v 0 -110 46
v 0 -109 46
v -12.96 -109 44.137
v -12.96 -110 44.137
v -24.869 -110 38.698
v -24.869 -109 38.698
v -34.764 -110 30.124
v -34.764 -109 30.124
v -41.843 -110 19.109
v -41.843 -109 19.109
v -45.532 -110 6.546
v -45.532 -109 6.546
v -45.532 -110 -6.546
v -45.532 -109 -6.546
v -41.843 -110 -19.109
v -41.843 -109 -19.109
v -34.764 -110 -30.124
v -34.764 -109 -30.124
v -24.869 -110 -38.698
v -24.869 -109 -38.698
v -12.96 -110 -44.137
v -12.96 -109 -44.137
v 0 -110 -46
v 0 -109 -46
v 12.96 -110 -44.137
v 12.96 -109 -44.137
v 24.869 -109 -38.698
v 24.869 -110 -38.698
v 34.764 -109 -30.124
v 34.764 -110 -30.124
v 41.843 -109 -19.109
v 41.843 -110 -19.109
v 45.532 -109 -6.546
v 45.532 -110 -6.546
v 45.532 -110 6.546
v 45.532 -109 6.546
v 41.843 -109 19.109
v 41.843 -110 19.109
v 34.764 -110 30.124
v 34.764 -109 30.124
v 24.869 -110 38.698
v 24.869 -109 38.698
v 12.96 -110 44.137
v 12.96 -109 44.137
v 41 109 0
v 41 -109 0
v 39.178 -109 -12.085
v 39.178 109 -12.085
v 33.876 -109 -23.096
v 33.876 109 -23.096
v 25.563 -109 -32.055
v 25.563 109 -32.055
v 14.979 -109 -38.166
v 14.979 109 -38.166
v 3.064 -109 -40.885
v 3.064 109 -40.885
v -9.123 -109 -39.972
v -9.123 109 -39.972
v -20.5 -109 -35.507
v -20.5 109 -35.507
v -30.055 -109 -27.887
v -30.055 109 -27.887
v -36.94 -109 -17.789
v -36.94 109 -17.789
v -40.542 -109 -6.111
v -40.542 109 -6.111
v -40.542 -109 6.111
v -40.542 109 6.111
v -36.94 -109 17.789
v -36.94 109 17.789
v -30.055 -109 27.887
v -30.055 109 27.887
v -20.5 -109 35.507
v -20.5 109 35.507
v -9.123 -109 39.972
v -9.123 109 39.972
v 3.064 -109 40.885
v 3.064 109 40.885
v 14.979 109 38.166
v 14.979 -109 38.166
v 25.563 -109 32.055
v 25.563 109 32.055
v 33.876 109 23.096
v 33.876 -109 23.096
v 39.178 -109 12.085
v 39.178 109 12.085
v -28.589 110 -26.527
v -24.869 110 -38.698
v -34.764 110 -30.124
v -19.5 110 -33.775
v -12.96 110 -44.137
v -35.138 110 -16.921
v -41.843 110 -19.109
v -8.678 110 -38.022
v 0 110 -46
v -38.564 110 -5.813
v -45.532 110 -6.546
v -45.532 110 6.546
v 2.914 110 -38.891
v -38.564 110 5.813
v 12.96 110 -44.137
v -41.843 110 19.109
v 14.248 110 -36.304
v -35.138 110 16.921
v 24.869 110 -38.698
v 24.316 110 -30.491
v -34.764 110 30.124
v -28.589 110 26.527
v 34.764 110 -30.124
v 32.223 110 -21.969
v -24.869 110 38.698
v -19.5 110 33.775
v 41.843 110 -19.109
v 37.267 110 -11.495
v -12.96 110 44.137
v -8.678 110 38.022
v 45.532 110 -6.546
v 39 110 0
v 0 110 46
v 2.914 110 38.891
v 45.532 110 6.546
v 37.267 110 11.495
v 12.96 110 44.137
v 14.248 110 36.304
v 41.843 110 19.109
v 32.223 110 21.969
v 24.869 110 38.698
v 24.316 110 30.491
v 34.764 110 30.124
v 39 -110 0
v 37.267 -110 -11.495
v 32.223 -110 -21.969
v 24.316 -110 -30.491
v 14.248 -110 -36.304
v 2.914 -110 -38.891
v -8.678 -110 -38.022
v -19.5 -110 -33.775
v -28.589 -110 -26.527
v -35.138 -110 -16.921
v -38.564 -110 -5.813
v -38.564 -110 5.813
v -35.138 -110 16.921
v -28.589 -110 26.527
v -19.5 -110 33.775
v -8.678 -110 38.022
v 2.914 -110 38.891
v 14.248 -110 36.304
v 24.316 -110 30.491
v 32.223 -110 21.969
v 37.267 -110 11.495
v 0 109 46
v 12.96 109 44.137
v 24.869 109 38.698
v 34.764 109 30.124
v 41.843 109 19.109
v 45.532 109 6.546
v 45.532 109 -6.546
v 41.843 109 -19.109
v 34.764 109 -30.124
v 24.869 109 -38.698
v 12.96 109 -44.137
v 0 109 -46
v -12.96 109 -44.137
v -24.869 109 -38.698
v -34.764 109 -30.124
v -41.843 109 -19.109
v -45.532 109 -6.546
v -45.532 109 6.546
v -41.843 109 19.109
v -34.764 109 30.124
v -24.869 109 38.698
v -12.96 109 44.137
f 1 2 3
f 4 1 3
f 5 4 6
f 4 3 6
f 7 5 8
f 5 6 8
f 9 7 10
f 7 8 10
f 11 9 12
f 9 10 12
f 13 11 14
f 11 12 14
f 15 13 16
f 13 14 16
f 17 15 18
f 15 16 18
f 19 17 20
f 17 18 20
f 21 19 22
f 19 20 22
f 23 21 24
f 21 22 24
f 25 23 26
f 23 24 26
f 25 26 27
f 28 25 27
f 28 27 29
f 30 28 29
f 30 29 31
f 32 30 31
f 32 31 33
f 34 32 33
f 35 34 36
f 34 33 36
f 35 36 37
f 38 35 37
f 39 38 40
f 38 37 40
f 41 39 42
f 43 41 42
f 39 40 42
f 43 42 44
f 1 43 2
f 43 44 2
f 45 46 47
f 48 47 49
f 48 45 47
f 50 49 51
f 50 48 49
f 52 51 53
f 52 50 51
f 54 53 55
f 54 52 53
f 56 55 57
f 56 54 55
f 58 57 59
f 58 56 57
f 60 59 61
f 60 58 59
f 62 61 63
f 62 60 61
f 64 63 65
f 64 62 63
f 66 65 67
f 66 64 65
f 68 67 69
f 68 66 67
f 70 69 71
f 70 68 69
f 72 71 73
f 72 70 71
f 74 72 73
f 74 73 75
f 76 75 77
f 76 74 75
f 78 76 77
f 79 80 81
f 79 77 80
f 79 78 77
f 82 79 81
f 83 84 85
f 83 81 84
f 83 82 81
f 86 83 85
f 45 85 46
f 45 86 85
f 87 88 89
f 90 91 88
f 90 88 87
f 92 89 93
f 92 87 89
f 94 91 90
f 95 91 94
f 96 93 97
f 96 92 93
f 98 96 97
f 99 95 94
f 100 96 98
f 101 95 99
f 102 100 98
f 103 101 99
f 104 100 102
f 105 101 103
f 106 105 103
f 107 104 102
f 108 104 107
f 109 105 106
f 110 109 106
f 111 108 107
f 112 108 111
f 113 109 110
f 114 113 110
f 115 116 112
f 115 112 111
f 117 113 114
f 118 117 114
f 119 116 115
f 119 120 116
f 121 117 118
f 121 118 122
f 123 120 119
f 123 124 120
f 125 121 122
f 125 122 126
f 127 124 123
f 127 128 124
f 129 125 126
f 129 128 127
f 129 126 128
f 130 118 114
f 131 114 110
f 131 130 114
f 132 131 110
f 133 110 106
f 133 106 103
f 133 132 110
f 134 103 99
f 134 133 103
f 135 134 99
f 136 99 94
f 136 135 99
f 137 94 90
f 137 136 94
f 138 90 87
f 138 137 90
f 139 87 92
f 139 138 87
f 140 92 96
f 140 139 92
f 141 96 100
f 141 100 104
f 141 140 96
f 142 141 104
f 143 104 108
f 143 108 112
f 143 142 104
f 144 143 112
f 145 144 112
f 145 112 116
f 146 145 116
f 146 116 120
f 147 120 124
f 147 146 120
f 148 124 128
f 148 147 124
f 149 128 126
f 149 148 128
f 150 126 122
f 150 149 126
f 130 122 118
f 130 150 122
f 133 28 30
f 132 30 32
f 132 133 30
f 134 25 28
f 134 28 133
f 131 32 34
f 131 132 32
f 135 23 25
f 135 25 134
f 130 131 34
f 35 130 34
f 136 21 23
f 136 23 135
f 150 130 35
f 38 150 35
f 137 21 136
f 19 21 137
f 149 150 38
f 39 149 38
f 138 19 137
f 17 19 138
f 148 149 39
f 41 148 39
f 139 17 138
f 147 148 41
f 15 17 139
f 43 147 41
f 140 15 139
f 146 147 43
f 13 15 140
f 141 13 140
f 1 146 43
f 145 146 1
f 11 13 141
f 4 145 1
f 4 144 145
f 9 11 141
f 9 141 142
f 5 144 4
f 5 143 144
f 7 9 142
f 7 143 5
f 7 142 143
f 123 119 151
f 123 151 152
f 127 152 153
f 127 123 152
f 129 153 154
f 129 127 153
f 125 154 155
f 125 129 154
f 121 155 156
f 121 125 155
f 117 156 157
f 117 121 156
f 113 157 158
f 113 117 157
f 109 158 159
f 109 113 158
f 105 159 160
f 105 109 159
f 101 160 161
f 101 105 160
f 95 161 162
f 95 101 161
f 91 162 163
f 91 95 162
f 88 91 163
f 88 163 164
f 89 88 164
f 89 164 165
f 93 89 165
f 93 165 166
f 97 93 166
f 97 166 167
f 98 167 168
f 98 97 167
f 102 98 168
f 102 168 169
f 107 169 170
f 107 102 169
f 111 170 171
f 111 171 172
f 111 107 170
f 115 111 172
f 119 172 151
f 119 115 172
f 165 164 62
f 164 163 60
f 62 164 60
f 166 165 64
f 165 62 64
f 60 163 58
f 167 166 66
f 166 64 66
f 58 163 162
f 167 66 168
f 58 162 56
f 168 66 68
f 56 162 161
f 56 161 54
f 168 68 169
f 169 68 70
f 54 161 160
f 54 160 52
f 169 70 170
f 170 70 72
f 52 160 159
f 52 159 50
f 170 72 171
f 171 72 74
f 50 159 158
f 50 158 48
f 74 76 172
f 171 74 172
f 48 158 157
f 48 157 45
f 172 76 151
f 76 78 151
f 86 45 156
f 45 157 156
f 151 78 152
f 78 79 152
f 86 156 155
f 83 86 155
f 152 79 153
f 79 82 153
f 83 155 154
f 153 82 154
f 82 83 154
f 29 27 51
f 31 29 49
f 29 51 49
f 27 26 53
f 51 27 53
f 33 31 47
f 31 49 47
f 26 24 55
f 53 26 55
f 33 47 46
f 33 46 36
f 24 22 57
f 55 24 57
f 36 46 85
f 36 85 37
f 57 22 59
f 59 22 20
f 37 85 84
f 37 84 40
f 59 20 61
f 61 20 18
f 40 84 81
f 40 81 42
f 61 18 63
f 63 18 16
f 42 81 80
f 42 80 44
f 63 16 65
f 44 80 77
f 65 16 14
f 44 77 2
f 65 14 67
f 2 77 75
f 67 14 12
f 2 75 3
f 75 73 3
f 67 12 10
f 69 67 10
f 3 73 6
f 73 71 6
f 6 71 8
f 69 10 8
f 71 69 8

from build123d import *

# Parameters (mm, degrees)
SCHIZZO1_R                   = 41
SCHIZZO1_R_2                 = 39
ESTRUSIONE_SOTTILE1_DEPTH    = 110
SCHIZZO2_R                   = 46
SCHIZZO2_R_2                 = 41
ESTRUSIONE_ESTRUSIONE1_DEPTH = 1
ESTRUSIONE_ESTRUSIONE2_START = -1
SCHIZZO3_R                   = 46
SCHIZZO3_R_2                 = 41
ESTRUSIONE_ESTRUSIONE2_DEPTH = 1


with BuildPart() as part:
    # Schizzo1 → Estrusione-Sottile1 (new, symmetric)
    with BuildSketch(Plane(origin=(0, 0, 0), x_dir=(1, 0, 0), z_dir=(0, 1, 0))):
        Circle(SCHIZZO1_R)
        Circle(SCHIZZO1_R_2, mode=Mode.SUBTRACT)
    extrude(amount=ESTRUSIONE_SOTTILE1_DEPTH, both=True)

    # Schizzo2 → Estrusione-Estrusione1 (add)
    with BuildSketch(Plane(origin=(0, 110, 0), x_dir=(1, 0, 0), z_dir=(0, 1, 0))):
        with Locations(Location((0, 0, 0), (0, 0, 270))):
            Circle(SCHIZZO2_R)
        Circle(SCHIZZO2_R_2, mode=Mode.SUBTRACT)
    extrude(amount=-ESTRUSIONE_ESTRUSIONE1_DEPTH)

    # Schizzo3 → Estrusione-Estrusione2 (add)
    with BuildSketch(Plane.XZ.offset(110).offset(ESTRUSIONE_ESTRUSIONE2_START)):
        with Locations(Location((0, 0, 0), (0, 0, 90))):
            Circle(SCHIZZO3_R)
        with Locations(Location((0, 0, 0), (0, 0, 270))):
            Circle(SCHIZZO3_R_2, mode=Mode.SUBTRACT)
    extrude(amount=ESTRUSIONE_ESTRUSIONE2_DEPTH)


solid = part.part
